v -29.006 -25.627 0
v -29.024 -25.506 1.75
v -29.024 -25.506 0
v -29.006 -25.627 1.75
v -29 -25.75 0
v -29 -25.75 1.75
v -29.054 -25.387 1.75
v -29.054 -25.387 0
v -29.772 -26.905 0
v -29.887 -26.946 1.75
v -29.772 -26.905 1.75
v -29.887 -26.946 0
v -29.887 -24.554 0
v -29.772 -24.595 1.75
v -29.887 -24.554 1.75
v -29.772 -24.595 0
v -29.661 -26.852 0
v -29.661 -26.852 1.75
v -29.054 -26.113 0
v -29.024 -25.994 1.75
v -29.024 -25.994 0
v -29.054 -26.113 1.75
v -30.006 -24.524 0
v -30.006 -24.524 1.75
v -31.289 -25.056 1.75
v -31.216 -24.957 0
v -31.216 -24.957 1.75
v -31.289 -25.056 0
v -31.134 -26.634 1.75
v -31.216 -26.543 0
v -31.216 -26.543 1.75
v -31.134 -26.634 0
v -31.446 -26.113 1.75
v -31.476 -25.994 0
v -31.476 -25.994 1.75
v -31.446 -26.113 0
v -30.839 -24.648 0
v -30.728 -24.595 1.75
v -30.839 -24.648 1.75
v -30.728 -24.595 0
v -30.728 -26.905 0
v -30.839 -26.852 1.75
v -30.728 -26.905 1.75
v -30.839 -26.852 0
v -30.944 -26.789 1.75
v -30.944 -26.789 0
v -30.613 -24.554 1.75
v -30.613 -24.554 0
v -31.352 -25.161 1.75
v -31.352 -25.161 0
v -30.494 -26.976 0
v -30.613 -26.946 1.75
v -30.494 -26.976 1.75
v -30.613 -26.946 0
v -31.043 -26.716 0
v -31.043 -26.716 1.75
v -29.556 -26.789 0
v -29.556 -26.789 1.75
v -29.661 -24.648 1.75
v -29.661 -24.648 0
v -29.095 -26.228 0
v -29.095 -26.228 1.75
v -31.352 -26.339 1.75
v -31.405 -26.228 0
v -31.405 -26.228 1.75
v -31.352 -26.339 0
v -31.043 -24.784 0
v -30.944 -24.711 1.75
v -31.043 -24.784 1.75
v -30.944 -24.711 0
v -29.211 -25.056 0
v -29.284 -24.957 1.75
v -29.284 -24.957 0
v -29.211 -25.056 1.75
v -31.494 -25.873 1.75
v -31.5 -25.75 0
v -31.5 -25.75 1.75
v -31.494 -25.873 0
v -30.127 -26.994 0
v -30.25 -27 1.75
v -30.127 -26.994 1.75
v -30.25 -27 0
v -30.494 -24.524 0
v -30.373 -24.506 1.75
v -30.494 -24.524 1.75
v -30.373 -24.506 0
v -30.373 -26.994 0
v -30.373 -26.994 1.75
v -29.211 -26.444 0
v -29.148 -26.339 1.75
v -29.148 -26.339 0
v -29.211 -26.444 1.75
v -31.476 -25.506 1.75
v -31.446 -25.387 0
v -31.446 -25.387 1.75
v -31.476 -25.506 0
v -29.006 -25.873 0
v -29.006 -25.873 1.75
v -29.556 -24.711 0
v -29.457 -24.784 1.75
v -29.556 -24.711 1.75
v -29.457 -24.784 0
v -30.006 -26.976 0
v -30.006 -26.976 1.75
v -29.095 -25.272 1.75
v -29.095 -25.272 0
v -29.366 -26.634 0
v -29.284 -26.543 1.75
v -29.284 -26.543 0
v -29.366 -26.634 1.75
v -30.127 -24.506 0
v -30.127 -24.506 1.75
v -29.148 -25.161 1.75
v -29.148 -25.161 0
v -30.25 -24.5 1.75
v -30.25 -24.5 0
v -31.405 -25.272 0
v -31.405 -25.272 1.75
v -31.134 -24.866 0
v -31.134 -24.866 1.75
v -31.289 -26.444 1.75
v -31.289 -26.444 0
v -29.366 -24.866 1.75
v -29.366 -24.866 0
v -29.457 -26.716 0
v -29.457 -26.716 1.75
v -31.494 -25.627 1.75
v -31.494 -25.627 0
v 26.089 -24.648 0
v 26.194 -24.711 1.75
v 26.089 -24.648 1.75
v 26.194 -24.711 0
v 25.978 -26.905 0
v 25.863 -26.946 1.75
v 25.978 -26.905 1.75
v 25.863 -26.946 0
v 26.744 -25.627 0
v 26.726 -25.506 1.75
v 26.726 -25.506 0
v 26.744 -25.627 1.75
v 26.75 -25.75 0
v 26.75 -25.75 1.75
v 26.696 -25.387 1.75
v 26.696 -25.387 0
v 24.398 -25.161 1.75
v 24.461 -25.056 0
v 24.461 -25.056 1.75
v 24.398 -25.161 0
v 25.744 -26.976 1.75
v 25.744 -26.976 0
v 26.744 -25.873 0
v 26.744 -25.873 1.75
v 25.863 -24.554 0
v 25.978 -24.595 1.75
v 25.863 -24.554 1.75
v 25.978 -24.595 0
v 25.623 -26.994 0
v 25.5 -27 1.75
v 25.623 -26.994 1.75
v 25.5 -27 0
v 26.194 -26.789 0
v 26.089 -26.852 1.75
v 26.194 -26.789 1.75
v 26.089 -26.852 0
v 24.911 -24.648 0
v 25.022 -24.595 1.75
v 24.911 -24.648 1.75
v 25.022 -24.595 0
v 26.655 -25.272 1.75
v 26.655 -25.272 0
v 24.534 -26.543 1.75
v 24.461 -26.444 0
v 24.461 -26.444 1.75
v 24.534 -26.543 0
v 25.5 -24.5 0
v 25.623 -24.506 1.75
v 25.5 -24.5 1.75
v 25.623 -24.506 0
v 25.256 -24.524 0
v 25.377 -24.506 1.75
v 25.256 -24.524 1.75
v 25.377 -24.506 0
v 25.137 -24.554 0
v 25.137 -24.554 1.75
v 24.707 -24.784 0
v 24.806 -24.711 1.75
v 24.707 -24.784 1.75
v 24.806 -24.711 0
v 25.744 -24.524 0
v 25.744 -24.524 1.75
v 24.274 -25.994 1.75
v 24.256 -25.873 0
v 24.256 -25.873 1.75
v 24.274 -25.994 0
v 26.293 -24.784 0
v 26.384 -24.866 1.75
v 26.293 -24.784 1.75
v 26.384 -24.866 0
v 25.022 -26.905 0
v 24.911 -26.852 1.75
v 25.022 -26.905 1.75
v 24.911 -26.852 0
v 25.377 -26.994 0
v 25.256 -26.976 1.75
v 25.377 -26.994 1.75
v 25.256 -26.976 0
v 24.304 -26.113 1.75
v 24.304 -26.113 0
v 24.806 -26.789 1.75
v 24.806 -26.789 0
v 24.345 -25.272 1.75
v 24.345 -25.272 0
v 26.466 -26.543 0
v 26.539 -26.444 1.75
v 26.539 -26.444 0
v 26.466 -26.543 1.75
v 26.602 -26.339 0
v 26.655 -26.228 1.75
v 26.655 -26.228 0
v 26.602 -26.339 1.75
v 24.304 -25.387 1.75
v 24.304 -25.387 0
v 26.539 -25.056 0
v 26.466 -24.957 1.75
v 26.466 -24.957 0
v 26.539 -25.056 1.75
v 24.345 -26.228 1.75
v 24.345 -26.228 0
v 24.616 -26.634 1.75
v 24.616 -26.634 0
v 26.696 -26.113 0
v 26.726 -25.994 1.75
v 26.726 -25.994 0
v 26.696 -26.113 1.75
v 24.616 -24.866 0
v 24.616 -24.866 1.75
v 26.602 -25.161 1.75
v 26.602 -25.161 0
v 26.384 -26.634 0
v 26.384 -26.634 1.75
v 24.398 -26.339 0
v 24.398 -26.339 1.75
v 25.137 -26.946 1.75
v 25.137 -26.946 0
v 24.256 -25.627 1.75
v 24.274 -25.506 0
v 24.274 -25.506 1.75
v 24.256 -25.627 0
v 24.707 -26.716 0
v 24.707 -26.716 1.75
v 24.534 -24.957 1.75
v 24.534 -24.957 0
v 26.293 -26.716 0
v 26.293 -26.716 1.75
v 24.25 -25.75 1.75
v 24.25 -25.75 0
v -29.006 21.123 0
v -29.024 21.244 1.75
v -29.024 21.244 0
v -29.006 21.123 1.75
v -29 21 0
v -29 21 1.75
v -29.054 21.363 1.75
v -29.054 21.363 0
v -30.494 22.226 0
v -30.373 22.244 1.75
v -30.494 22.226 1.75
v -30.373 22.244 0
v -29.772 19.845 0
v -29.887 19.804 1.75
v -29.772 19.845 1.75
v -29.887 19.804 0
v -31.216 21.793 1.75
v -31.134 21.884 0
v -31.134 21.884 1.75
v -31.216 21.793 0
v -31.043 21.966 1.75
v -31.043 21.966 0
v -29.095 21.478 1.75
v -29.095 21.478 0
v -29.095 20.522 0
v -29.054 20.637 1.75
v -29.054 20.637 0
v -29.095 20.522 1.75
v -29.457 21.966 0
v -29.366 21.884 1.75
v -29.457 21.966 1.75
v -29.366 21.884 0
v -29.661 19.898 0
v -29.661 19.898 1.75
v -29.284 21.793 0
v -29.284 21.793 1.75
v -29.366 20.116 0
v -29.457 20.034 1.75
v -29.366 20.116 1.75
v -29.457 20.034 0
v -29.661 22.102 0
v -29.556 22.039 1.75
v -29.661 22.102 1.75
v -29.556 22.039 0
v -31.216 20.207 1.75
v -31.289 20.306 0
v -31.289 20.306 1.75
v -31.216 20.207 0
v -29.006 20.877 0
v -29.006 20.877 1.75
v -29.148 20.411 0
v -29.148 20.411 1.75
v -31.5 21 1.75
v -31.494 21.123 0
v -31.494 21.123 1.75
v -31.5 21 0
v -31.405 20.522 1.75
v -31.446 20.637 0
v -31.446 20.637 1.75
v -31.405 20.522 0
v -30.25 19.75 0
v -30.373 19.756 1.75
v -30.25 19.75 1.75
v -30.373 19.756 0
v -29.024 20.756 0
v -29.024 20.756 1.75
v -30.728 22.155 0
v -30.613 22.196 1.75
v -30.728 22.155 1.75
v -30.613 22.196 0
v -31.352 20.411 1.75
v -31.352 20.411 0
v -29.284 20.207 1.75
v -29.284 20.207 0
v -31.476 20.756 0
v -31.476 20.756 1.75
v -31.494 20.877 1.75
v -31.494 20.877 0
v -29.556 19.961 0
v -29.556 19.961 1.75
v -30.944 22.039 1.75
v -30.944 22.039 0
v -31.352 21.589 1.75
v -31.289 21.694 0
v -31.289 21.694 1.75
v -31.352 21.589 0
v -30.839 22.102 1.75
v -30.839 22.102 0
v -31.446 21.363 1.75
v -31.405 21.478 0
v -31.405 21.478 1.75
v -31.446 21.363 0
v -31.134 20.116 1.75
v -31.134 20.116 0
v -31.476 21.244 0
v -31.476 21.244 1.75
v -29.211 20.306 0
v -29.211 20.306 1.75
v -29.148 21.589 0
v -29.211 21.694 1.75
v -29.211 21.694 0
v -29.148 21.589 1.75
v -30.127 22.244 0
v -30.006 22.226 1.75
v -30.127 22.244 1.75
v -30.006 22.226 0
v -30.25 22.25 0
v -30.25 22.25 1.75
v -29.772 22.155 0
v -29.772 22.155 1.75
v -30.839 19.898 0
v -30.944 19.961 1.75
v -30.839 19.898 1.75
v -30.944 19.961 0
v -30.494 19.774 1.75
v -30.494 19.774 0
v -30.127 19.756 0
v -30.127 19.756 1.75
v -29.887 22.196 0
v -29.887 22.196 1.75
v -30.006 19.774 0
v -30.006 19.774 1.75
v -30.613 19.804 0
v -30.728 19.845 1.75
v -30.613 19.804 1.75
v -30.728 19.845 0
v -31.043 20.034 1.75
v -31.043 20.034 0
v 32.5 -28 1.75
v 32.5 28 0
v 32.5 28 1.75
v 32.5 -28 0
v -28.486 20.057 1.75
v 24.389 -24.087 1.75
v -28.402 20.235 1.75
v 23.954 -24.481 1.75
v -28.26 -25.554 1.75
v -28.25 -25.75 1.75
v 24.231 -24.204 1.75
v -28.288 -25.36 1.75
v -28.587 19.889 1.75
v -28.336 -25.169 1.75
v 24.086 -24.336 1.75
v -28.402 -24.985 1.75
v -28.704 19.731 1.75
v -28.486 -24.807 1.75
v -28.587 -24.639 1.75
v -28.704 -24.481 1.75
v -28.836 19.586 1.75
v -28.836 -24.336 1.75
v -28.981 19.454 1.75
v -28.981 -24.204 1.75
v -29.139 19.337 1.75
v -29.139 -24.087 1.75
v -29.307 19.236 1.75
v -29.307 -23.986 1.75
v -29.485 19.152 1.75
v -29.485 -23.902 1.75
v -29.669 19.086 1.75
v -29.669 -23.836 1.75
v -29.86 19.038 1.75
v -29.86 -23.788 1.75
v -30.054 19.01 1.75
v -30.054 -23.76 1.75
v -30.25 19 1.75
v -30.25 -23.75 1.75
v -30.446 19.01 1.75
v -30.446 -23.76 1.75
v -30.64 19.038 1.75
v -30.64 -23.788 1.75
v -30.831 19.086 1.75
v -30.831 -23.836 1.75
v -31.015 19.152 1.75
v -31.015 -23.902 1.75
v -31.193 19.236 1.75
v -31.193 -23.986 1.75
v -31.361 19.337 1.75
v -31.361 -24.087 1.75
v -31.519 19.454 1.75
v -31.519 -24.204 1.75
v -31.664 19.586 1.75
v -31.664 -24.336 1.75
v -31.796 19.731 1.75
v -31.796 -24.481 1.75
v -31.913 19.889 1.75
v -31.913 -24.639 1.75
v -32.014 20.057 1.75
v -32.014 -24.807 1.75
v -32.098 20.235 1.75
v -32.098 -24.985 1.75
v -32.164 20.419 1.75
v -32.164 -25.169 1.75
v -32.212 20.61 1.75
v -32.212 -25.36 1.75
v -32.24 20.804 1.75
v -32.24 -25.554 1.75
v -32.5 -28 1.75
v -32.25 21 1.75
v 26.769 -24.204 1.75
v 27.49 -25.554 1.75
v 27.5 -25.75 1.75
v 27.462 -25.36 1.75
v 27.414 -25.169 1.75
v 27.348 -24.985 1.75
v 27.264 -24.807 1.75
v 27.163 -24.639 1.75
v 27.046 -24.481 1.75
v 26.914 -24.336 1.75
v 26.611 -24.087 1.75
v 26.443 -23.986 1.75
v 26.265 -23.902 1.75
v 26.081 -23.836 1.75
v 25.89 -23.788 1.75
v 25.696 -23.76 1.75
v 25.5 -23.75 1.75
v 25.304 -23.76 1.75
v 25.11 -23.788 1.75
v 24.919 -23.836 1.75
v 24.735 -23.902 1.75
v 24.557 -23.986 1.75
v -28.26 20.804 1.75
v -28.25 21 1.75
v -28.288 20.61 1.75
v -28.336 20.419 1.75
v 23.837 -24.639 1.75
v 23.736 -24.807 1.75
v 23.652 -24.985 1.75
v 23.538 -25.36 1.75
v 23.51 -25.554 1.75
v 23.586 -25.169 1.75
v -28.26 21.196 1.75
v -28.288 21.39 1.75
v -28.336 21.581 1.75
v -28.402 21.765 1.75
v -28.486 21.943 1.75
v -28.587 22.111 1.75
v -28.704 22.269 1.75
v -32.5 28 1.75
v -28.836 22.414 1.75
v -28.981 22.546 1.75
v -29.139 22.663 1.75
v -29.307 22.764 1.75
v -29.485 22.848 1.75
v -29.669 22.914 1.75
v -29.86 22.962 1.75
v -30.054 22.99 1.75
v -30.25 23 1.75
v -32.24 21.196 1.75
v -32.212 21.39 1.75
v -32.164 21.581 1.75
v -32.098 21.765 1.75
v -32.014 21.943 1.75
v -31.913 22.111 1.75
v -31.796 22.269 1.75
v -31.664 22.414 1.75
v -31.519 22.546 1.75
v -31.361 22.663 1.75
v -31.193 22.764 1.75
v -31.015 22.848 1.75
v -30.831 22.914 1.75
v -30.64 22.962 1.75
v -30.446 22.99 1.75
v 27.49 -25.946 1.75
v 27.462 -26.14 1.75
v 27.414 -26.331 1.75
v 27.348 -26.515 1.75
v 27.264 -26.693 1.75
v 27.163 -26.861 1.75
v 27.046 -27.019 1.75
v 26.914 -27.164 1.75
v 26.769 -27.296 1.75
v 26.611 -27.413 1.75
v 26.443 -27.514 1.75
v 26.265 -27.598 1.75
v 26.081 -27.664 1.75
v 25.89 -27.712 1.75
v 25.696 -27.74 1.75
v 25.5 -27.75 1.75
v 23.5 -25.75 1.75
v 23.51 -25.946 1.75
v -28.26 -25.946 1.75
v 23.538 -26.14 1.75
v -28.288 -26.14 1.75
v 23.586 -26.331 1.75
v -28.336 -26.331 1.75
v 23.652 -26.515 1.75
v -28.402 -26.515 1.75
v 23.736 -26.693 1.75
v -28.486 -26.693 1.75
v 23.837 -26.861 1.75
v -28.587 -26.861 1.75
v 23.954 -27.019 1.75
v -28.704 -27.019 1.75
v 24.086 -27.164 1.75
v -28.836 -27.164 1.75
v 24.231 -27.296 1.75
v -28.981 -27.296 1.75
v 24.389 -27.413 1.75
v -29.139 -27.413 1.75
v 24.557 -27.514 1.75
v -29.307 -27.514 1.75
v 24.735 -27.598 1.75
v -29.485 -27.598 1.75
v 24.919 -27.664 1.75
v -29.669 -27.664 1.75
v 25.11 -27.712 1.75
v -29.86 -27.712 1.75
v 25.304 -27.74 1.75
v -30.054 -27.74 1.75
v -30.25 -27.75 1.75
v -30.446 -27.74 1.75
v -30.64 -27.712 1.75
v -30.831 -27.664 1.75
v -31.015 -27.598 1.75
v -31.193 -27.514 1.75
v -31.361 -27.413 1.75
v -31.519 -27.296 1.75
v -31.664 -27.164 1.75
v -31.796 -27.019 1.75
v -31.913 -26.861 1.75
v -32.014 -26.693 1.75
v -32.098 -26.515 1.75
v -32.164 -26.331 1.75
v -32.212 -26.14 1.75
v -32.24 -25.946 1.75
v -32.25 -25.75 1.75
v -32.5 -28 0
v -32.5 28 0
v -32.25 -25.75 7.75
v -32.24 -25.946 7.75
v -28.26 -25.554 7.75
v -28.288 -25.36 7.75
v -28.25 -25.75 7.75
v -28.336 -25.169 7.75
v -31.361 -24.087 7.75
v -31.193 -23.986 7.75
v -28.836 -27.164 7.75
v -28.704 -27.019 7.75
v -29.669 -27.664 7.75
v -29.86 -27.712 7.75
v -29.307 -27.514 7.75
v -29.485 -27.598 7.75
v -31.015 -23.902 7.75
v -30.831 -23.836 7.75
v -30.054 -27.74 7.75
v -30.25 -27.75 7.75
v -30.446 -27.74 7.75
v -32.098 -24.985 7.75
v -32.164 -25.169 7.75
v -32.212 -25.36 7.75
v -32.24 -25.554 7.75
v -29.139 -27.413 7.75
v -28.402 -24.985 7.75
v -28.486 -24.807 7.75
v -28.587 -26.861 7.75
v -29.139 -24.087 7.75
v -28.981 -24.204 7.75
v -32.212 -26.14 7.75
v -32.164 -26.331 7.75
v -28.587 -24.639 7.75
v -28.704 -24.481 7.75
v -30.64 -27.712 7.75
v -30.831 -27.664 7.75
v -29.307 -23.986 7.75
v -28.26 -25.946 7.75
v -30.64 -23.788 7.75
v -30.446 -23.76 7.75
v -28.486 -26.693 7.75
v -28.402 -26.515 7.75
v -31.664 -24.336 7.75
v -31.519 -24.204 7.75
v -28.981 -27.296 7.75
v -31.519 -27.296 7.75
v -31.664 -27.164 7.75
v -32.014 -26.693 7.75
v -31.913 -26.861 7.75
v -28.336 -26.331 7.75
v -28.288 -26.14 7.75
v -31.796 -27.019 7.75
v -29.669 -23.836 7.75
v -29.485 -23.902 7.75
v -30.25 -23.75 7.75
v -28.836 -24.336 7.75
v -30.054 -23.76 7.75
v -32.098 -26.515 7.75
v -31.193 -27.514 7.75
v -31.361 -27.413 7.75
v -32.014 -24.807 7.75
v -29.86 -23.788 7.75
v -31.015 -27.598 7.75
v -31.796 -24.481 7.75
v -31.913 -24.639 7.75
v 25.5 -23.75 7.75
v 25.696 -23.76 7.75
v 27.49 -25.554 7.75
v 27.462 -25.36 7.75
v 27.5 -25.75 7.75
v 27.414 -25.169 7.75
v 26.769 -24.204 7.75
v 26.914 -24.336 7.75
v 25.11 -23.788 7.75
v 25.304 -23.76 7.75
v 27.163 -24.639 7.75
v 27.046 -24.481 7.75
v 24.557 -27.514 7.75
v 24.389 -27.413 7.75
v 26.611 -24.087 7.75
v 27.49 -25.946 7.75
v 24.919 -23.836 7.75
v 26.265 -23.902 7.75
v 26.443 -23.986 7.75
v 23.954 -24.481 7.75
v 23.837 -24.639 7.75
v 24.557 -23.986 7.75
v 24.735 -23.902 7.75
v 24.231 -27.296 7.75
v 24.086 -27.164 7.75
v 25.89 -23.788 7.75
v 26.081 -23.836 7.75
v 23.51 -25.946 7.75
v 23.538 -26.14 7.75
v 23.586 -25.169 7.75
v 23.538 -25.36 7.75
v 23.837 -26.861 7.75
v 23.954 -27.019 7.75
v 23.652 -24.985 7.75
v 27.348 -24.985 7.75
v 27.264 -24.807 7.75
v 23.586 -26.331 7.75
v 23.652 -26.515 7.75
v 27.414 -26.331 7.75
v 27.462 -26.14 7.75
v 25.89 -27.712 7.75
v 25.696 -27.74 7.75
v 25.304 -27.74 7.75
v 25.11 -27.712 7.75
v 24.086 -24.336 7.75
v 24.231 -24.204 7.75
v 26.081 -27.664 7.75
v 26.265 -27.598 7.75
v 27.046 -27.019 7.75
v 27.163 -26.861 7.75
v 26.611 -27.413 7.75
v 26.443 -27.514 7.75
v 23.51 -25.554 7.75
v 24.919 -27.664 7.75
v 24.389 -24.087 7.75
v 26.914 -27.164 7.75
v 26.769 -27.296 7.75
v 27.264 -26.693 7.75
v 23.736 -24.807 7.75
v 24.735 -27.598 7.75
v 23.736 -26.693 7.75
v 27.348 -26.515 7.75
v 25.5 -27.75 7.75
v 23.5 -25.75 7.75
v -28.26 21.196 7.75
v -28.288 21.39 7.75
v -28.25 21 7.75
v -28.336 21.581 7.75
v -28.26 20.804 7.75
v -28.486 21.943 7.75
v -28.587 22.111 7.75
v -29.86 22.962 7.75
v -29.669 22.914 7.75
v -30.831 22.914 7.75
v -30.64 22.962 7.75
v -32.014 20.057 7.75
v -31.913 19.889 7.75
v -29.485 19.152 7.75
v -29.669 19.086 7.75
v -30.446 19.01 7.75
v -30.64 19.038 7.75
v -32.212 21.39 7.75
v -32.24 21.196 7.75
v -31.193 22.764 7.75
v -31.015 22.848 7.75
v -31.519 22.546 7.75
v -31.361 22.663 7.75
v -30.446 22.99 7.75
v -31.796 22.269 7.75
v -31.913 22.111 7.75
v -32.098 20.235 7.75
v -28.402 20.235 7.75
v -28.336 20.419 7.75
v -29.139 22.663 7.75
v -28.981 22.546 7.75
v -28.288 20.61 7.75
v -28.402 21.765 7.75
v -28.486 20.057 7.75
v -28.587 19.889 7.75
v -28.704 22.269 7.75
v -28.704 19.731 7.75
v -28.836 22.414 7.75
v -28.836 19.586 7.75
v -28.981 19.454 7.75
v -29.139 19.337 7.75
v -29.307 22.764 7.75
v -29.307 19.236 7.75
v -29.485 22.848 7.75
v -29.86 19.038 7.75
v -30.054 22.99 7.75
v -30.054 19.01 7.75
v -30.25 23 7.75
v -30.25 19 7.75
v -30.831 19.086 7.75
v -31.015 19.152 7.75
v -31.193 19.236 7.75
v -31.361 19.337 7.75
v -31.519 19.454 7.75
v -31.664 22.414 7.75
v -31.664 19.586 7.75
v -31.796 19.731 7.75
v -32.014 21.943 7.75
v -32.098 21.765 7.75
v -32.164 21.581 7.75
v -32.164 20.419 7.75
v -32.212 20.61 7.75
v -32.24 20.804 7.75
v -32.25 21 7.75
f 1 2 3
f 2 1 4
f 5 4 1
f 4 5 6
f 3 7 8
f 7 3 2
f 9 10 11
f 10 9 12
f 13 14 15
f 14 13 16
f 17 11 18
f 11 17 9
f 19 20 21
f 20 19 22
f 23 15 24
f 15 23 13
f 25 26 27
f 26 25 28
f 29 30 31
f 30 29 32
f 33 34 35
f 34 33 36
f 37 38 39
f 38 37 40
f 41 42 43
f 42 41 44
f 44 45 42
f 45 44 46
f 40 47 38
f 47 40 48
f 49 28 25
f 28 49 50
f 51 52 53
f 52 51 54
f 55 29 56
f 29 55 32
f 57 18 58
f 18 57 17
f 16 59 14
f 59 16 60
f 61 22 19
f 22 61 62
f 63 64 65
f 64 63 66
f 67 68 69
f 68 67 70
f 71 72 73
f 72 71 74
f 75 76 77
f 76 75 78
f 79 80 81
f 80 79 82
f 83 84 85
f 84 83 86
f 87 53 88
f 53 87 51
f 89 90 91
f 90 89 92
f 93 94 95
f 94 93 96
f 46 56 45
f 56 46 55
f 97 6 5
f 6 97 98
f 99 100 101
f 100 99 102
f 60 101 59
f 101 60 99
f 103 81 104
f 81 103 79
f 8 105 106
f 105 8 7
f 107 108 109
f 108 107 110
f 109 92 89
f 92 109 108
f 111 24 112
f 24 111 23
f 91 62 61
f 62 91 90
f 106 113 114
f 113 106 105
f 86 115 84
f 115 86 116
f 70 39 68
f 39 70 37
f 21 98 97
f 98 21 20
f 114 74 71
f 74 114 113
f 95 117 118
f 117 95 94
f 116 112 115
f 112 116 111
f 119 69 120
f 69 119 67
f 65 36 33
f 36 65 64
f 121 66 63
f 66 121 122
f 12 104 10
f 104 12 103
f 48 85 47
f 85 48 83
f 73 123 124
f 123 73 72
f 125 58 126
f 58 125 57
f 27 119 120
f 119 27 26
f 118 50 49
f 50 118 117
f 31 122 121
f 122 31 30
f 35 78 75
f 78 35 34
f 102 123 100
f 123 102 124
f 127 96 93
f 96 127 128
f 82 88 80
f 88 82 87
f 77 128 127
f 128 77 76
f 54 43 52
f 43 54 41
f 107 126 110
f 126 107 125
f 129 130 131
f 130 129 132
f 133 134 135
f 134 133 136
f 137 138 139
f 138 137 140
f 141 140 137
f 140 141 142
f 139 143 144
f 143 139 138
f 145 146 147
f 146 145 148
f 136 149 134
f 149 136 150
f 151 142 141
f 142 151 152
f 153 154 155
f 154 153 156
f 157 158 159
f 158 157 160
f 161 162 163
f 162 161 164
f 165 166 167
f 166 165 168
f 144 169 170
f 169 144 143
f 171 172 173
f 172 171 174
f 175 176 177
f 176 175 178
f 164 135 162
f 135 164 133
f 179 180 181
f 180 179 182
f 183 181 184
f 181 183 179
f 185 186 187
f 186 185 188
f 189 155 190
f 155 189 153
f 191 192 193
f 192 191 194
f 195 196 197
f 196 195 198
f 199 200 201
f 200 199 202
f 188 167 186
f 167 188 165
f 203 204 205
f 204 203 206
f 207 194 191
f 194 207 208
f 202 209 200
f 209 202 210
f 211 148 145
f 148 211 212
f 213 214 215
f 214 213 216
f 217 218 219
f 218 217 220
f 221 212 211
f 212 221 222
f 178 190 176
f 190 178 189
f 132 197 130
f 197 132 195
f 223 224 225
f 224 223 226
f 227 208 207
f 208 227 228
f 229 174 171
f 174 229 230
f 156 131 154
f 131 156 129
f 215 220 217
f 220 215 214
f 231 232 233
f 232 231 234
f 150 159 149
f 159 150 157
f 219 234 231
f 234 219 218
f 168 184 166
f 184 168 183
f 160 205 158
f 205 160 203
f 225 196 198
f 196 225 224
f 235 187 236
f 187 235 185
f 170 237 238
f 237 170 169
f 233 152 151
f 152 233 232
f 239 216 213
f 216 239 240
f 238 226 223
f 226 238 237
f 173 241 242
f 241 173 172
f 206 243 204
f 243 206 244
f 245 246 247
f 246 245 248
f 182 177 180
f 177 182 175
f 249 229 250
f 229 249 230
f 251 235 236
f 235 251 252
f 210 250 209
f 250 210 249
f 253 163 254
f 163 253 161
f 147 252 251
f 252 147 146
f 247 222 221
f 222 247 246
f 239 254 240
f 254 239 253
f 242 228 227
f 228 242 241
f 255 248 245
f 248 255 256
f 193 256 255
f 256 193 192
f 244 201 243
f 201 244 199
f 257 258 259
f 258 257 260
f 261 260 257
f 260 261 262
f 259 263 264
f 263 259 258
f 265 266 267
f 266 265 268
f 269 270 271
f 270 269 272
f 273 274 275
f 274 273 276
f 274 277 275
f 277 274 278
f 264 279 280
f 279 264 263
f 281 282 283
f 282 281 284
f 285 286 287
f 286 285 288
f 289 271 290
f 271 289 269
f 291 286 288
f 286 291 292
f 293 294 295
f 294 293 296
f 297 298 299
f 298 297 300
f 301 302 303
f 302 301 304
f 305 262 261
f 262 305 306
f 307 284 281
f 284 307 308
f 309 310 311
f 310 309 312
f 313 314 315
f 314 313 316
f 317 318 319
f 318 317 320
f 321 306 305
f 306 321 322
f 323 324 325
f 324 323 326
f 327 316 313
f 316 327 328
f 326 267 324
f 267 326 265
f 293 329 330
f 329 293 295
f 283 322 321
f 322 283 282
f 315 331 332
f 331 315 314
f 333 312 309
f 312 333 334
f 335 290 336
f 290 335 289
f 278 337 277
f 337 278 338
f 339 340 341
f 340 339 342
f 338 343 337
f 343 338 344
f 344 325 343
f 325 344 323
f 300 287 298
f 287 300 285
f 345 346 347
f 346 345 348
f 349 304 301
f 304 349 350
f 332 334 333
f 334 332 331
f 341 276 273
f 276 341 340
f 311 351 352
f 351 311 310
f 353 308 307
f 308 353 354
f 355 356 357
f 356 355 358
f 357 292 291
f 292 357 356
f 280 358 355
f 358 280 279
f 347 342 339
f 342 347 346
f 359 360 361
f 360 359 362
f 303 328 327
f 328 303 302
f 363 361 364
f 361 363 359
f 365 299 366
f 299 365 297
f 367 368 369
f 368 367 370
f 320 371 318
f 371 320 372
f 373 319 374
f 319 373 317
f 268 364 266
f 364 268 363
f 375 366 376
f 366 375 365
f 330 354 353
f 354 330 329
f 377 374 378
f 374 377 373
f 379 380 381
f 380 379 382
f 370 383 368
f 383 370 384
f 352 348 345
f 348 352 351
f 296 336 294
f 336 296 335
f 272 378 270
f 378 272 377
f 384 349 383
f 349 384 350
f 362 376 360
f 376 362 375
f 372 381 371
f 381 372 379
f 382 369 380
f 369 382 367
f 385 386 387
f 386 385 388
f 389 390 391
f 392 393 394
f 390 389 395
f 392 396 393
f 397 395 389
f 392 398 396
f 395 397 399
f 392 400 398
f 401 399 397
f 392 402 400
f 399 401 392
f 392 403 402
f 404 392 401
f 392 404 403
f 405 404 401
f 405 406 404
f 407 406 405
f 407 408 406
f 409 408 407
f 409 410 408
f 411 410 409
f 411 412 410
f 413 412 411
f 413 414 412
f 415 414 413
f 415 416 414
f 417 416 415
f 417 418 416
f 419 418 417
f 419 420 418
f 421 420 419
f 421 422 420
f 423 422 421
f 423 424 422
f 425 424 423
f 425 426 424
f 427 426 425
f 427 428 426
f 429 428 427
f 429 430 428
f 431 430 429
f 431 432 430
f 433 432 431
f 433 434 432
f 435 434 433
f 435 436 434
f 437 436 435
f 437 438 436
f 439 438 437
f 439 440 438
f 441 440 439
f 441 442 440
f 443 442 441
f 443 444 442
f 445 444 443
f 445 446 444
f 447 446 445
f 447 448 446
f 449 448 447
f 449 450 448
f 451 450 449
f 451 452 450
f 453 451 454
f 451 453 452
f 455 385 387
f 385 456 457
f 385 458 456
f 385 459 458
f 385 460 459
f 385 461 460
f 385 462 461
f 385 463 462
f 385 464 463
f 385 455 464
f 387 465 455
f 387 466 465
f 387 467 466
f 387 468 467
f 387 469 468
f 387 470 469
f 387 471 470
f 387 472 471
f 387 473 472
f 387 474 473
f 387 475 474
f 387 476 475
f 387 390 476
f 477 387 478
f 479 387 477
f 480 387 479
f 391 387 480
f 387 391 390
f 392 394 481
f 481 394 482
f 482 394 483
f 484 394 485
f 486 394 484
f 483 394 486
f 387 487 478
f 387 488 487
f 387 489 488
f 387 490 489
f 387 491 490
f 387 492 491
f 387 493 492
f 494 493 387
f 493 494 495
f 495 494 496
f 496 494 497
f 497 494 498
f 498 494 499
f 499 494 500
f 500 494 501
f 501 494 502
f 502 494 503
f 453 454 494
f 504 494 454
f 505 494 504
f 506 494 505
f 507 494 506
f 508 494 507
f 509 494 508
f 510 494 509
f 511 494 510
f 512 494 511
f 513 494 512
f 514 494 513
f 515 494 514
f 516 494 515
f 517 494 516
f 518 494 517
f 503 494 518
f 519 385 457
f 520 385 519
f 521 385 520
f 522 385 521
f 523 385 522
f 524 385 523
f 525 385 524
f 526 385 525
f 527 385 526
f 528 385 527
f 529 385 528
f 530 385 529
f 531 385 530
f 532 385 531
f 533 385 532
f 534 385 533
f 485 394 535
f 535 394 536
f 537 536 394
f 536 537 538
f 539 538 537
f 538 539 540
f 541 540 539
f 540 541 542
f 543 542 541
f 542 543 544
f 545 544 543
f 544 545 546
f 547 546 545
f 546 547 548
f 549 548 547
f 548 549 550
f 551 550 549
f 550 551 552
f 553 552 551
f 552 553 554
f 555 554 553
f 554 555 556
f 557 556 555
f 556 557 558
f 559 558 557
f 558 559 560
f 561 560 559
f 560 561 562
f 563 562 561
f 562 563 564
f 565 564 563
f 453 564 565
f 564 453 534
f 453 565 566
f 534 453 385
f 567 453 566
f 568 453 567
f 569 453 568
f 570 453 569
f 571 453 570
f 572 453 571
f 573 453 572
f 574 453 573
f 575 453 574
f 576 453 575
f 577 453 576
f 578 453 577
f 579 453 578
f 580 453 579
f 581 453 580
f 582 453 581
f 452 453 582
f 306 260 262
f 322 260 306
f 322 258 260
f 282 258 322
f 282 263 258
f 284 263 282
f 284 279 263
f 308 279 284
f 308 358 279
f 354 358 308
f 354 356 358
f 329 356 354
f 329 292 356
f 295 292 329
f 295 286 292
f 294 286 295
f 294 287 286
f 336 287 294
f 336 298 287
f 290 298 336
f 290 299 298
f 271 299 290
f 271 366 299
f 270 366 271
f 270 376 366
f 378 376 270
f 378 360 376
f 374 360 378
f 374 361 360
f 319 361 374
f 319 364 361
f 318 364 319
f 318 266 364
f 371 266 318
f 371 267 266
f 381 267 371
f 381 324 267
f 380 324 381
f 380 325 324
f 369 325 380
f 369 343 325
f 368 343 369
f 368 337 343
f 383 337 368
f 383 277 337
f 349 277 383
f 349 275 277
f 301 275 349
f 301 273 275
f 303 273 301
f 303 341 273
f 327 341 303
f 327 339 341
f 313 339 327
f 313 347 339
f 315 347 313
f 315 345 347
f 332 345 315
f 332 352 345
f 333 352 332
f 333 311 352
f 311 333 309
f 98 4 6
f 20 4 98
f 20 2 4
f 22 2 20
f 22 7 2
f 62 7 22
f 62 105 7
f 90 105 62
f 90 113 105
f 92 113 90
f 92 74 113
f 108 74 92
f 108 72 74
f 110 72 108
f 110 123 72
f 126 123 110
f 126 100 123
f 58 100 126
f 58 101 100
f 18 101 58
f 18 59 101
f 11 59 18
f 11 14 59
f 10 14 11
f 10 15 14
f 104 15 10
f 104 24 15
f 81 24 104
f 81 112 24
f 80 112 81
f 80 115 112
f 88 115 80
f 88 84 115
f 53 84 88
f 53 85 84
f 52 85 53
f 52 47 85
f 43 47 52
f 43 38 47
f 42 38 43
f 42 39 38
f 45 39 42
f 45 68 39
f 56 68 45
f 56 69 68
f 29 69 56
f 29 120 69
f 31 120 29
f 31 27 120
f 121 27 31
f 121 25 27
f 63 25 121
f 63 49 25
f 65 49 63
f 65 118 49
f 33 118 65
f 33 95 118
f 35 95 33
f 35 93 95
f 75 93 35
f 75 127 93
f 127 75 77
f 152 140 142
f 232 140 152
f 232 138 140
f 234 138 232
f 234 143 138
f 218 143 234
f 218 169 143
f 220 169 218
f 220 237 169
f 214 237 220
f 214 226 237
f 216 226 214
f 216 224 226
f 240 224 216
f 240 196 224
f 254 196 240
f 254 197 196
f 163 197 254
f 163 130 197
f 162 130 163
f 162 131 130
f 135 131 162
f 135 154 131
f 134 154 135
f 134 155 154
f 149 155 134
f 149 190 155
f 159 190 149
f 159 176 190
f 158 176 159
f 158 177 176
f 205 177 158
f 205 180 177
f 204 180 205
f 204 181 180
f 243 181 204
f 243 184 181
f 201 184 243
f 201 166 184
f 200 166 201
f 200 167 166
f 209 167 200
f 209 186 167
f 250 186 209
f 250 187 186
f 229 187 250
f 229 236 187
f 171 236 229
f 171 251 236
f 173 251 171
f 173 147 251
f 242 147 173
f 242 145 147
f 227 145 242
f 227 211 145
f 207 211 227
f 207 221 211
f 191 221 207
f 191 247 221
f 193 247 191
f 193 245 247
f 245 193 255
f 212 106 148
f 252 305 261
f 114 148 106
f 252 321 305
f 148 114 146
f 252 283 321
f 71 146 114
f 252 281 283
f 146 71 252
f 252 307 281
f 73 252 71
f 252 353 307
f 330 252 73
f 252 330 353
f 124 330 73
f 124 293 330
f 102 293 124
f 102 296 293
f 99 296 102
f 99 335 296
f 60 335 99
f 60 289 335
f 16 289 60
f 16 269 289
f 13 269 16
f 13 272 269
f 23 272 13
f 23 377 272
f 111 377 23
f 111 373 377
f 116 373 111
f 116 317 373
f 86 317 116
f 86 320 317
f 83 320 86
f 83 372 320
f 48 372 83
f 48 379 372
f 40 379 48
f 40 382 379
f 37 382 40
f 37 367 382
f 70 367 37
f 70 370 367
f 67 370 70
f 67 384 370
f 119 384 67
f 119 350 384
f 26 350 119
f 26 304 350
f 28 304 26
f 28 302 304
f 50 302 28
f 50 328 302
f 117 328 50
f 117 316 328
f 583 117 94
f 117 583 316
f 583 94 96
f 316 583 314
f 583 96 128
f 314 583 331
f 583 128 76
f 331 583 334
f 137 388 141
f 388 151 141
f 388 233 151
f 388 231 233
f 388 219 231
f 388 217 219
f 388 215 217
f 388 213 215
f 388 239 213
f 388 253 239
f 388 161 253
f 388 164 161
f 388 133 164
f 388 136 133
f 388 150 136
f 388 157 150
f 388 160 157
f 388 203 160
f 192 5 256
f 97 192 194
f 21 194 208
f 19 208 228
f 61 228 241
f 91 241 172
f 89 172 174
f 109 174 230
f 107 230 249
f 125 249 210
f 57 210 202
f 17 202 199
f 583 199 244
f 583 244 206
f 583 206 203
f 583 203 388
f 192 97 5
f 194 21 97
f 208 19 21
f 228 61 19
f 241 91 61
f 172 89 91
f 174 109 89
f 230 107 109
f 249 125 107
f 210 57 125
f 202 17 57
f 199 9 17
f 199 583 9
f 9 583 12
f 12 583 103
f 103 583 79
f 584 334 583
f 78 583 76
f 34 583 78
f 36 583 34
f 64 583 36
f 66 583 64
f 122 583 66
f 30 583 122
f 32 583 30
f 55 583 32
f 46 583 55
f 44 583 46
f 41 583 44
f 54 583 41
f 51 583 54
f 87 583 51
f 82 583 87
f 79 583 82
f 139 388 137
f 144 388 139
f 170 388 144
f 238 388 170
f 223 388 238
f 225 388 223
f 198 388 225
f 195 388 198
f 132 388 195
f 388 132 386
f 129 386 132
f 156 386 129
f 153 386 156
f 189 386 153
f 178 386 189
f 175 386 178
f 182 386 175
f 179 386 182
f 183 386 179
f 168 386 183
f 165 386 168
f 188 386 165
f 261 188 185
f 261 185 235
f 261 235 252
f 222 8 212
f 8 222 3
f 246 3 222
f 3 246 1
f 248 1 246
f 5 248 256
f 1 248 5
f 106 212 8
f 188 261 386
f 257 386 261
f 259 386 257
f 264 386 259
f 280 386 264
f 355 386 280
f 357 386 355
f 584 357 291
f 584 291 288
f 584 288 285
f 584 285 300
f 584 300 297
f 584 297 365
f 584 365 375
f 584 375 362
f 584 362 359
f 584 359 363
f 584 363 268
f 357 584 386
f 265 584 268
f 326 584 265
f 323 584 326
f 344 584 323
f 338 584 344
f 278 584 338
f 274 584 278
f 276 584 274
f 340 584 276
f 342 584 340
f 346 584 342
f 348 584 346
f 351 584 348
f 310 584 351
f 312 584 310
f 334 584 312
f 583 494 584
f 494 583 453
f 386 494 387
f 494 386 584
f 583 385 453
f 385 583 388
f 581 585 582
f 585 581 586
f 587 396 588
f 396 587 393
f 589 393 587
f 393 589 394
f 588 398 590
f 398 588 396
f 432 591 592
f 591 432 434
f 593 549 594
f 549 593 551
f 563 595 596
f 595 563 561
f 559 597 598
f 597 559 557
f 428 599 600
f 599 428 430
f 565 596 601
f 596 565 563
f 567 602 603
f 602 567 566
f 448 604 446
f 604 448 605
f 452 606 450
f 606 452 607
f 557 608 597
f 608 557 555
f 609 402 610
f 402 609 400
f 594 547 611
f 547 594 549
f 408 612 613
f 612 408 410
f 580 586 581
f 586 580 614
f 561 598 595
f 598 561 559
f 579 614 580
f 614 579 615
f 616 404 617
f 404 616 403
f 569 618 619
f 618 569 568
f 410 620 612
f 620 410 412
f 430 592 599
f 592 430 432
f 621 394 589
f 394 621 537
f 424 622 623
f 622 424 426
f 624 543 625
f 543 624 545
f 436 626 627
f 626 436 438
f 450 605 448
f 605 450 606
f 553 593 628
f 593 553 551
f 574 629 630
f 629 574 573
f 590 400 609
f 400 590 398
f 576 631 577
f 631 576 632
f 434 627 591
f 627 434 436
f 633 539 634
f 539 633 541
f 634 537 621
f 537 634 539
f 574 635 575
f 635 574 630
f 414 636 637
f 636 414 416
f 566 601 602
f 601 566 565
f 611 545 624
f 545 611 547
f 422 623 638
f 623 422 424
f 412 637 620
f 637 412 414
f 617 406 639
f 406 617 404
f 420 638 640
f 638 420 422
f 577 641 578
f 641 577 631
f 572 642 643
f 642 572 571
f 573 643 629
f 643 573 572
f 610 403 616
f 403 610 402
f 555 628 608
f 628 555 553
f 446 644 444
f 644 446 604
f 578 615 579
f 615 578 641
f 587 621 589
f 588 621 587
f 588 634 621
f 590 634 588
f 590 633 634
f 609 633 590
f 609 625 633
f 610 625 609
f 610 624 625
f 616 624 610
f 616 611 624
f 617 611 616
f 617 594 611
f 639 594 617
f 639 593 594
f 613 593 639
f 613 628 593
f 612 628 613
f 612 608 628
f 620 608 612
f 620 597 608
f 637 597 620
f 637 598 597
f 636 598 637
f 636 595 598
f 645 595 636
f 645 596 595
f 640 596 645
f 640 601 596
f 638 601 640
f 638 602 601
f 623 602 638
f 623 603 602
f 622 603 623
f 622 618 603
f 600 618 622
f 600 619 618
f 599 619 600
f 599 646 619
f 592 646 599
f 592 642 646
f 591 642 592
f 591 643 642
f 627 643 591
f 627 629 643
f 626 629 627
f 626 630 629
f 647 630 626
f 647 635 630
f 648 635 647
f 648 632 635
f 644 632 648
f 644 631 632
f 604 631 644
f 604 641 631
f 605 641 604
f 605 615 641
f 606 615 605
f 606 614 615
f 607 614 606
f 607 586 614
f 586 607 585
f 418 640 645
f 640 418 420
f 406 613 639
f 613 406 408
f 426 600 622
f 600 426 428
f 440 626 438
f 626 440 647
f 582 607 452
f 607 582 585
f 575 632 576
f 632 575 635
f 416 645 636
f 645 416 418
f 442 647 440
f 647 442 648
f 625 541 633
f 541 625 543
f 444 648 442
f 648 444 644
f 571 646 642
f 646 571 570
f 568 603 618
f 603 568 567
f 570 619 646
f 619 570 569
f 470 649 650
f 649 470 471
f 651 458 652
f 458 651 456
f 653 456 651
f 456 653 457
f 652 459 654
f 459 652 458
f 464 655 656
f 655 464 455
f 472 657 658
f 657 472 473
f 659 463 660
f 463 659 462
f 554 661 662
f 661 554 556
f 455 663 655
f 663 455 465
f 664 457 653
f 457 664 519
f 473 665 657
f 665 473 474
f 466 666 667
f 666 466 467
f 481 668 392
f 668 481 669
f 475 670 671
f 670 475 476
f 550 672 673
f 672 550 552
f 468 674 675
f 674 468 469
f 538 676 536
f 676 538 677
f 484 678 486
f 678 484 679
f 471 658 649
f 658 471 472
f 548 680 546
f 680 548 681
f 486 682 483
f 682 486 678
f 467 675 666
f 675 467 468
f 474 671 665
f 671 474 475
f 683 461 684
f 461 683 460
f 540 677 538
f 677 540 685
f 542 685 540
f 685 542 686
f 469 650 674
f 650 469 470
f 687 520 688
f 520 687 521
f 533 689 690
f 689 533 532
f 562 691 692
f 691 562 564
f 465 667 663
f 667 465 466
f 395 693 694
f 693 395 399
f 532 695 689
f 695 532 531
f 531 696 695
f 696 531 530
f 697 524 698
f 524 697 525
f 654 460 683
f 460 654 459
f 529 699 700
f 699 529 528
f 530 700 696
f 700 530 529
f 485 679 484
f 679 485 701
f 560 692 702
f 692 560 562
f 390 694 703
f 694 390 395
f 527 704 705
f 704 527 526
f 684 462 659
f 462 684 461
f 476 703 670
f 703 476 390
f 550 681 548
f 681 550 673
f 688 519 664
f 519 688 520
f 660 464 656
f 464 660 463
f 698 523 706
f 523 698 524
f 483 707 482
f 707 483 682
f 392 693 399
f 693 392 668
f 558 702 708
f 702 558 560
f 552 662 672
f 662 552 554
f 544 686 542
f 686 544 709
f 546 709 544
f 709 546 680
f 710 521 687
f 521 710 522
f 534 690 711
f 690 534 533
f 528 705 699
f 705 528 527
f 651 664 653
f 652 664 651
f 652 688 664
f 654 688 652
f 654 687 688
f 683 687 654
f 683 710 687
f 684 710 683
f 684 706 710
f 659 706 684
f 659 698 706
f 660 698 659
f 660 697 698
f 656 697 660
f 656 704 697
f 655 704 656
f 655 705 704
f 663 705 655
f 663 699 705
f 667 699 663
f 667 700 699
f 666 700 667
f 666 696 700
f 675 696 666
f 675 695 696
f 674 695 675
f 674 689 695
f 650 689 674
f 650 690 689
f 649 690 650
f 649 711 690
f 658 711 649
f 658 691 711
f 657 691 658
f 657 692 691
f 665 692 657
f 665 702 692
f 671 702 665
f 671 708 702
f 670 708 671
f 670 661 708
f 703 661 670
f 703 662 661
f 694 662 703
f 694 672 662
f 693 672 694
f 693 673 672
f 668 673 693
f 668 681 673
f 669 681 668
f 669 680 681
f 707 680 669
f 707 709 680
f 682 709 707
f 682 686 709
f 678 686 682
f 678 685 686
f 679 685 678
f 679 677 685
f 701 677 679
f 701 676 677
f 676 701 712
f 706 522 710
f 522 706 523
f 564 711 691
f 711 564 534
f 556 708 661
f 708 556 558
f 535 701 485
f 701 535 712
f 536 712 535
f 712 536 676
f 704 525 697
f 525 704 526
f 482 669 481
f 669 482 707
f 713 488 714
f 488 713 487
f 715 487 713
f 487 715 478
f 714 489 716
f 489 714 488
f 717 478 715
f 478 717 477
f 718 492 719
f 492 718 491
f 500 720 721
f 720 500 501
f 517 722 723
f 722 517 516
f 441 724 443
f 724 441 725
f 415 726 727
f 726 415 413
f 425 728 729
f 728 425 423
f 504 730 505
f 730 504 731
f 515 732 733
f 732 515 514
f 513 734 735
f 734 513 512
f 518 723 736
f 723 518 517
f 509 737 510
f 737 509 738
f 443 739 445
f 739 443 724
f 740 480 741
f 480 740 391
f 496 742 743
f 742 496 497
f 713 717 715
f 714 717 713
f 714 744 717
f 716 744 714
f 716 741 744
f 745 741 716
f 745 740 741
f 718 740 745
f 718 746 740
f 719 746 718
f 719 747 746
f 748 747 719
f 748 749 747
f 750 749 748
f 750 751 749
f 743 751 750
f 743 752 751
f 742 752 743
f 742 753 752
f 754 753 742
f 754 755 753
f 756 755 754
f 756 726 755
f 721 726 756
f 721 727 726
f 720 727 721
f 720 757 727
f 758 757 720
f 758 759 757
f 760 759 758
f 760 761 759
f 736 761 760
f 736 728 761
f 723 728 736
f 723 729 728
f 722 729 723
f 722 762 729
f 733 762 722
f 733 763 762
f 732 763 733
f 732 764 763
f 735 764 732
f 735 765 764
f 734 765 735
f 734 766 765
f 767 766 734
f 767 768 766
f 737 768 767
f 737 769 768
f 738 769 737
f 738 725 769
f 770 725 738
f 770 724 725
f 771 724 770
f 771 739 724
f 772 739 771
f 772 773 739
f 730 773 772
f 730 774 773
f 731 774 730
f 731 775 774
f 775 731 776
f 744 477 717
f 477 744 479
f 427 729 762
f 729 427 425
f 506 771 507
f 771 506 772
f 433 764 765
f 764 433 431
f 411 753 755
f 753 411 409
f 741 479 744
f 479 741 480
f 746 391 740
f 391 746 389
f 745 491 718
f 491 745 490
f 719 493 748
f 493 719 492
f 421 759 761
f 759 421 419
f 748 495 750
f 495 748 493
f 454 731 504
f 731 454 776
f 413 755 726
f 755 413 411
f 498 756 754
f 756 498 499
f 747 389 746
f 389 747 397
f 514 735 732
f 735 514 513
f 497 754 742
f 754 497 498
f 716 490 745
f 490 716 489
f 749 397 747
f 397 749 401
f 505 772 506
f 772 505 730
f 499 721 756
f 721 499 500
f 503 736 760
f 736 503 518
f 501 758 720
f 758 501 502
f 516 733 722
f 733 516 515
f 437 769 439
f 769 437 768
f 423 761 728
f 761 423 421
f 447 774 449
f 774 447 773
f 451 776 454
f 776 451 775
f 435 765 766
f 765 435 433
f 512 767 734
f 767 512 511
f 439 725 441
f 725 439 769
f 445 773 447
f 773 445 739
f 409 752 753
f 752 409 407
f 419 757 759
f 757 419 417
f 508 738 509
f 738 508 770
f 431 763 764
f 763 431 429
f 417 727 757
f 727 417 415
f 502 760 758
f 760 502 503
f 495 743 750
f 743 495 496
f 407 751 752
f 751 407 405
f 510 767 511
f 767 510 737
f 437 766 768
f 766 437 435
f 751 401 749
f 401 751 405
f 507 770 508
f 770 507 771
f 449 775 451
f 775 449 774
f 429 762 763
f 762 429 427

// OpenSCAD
// Arducam Camarray HAT UC-512 (parametric, 3-hole version)
// Origin: PCB centered at (0,0); bottom at Z=0.

module hat_uc512(
    pcb   = [65, 56, 1.75],     // [L, W, T] mm
    hd    = 2.5,                // hole diameter
    // Three hole centers given from LOWER-LEFT PCB corner (mm):
    // Default = triangular pattern: (ox,oy), (ox+px,oy), (ox,oy+py)
    holes = [ [2.25,2.25], [58,2.25], [2.25,49.0] ],
    show_keepout = false,       // draw keep-outs above PCB?
    ko    = [3.5, 5.0],         // [keep-out diameter, height]
    pcb_col = "#177245",
    $fn = 64
){
    // Unpack
    L = pcb[0]; W = pcb[1]; T = pcb[2];
    ko_d = ko[0]; ko_h = ko[1];

    // Convert lower-left based coords -> centered-origin coords
    function to_center(p) = [ p[0] - L/2, p[1] - W/2 ];

    // --- PCB plate ---
    module pcb_plate(){
        color(pcb_col)
        translate([-L/2, -W/2, 0])
            cube([L, W, T], center=false);
    }

    // --- Geometry ---
    difference(){
        pcb_plate();

        // Drill exactly 3 holes (robust to any 3-length list)
        for (i = [0 : min(2, len(holes)-1)]) {
            p = to_center(holes[i]);
            translate([p[0], p[1], -0.1])
                cylinder(d=hd, h=T+0.2, $fn=$fn);
        }
    }

    // Optional keep-outs
    if (show_keepout)
        for (i = [0 : min(2, len(holes)-1)]) {
            p = to_center(holes[i]);
            color([1,0,0,0.25])
            translate([p[0], p[1], T])
                cylinder(d=ko_d, h=ko_h, $fn=$fn);
        }
}

// --- Examples (comment out in library file) ---
 hat_uc512(
   pcb=[65, 56, 1.75],
   hd=2.5,
   holes=[ [2.25,2.25], [58,2.25], [2.25,49.0] ],
   show_keepout=true,
   ko=[4,6]
 );
